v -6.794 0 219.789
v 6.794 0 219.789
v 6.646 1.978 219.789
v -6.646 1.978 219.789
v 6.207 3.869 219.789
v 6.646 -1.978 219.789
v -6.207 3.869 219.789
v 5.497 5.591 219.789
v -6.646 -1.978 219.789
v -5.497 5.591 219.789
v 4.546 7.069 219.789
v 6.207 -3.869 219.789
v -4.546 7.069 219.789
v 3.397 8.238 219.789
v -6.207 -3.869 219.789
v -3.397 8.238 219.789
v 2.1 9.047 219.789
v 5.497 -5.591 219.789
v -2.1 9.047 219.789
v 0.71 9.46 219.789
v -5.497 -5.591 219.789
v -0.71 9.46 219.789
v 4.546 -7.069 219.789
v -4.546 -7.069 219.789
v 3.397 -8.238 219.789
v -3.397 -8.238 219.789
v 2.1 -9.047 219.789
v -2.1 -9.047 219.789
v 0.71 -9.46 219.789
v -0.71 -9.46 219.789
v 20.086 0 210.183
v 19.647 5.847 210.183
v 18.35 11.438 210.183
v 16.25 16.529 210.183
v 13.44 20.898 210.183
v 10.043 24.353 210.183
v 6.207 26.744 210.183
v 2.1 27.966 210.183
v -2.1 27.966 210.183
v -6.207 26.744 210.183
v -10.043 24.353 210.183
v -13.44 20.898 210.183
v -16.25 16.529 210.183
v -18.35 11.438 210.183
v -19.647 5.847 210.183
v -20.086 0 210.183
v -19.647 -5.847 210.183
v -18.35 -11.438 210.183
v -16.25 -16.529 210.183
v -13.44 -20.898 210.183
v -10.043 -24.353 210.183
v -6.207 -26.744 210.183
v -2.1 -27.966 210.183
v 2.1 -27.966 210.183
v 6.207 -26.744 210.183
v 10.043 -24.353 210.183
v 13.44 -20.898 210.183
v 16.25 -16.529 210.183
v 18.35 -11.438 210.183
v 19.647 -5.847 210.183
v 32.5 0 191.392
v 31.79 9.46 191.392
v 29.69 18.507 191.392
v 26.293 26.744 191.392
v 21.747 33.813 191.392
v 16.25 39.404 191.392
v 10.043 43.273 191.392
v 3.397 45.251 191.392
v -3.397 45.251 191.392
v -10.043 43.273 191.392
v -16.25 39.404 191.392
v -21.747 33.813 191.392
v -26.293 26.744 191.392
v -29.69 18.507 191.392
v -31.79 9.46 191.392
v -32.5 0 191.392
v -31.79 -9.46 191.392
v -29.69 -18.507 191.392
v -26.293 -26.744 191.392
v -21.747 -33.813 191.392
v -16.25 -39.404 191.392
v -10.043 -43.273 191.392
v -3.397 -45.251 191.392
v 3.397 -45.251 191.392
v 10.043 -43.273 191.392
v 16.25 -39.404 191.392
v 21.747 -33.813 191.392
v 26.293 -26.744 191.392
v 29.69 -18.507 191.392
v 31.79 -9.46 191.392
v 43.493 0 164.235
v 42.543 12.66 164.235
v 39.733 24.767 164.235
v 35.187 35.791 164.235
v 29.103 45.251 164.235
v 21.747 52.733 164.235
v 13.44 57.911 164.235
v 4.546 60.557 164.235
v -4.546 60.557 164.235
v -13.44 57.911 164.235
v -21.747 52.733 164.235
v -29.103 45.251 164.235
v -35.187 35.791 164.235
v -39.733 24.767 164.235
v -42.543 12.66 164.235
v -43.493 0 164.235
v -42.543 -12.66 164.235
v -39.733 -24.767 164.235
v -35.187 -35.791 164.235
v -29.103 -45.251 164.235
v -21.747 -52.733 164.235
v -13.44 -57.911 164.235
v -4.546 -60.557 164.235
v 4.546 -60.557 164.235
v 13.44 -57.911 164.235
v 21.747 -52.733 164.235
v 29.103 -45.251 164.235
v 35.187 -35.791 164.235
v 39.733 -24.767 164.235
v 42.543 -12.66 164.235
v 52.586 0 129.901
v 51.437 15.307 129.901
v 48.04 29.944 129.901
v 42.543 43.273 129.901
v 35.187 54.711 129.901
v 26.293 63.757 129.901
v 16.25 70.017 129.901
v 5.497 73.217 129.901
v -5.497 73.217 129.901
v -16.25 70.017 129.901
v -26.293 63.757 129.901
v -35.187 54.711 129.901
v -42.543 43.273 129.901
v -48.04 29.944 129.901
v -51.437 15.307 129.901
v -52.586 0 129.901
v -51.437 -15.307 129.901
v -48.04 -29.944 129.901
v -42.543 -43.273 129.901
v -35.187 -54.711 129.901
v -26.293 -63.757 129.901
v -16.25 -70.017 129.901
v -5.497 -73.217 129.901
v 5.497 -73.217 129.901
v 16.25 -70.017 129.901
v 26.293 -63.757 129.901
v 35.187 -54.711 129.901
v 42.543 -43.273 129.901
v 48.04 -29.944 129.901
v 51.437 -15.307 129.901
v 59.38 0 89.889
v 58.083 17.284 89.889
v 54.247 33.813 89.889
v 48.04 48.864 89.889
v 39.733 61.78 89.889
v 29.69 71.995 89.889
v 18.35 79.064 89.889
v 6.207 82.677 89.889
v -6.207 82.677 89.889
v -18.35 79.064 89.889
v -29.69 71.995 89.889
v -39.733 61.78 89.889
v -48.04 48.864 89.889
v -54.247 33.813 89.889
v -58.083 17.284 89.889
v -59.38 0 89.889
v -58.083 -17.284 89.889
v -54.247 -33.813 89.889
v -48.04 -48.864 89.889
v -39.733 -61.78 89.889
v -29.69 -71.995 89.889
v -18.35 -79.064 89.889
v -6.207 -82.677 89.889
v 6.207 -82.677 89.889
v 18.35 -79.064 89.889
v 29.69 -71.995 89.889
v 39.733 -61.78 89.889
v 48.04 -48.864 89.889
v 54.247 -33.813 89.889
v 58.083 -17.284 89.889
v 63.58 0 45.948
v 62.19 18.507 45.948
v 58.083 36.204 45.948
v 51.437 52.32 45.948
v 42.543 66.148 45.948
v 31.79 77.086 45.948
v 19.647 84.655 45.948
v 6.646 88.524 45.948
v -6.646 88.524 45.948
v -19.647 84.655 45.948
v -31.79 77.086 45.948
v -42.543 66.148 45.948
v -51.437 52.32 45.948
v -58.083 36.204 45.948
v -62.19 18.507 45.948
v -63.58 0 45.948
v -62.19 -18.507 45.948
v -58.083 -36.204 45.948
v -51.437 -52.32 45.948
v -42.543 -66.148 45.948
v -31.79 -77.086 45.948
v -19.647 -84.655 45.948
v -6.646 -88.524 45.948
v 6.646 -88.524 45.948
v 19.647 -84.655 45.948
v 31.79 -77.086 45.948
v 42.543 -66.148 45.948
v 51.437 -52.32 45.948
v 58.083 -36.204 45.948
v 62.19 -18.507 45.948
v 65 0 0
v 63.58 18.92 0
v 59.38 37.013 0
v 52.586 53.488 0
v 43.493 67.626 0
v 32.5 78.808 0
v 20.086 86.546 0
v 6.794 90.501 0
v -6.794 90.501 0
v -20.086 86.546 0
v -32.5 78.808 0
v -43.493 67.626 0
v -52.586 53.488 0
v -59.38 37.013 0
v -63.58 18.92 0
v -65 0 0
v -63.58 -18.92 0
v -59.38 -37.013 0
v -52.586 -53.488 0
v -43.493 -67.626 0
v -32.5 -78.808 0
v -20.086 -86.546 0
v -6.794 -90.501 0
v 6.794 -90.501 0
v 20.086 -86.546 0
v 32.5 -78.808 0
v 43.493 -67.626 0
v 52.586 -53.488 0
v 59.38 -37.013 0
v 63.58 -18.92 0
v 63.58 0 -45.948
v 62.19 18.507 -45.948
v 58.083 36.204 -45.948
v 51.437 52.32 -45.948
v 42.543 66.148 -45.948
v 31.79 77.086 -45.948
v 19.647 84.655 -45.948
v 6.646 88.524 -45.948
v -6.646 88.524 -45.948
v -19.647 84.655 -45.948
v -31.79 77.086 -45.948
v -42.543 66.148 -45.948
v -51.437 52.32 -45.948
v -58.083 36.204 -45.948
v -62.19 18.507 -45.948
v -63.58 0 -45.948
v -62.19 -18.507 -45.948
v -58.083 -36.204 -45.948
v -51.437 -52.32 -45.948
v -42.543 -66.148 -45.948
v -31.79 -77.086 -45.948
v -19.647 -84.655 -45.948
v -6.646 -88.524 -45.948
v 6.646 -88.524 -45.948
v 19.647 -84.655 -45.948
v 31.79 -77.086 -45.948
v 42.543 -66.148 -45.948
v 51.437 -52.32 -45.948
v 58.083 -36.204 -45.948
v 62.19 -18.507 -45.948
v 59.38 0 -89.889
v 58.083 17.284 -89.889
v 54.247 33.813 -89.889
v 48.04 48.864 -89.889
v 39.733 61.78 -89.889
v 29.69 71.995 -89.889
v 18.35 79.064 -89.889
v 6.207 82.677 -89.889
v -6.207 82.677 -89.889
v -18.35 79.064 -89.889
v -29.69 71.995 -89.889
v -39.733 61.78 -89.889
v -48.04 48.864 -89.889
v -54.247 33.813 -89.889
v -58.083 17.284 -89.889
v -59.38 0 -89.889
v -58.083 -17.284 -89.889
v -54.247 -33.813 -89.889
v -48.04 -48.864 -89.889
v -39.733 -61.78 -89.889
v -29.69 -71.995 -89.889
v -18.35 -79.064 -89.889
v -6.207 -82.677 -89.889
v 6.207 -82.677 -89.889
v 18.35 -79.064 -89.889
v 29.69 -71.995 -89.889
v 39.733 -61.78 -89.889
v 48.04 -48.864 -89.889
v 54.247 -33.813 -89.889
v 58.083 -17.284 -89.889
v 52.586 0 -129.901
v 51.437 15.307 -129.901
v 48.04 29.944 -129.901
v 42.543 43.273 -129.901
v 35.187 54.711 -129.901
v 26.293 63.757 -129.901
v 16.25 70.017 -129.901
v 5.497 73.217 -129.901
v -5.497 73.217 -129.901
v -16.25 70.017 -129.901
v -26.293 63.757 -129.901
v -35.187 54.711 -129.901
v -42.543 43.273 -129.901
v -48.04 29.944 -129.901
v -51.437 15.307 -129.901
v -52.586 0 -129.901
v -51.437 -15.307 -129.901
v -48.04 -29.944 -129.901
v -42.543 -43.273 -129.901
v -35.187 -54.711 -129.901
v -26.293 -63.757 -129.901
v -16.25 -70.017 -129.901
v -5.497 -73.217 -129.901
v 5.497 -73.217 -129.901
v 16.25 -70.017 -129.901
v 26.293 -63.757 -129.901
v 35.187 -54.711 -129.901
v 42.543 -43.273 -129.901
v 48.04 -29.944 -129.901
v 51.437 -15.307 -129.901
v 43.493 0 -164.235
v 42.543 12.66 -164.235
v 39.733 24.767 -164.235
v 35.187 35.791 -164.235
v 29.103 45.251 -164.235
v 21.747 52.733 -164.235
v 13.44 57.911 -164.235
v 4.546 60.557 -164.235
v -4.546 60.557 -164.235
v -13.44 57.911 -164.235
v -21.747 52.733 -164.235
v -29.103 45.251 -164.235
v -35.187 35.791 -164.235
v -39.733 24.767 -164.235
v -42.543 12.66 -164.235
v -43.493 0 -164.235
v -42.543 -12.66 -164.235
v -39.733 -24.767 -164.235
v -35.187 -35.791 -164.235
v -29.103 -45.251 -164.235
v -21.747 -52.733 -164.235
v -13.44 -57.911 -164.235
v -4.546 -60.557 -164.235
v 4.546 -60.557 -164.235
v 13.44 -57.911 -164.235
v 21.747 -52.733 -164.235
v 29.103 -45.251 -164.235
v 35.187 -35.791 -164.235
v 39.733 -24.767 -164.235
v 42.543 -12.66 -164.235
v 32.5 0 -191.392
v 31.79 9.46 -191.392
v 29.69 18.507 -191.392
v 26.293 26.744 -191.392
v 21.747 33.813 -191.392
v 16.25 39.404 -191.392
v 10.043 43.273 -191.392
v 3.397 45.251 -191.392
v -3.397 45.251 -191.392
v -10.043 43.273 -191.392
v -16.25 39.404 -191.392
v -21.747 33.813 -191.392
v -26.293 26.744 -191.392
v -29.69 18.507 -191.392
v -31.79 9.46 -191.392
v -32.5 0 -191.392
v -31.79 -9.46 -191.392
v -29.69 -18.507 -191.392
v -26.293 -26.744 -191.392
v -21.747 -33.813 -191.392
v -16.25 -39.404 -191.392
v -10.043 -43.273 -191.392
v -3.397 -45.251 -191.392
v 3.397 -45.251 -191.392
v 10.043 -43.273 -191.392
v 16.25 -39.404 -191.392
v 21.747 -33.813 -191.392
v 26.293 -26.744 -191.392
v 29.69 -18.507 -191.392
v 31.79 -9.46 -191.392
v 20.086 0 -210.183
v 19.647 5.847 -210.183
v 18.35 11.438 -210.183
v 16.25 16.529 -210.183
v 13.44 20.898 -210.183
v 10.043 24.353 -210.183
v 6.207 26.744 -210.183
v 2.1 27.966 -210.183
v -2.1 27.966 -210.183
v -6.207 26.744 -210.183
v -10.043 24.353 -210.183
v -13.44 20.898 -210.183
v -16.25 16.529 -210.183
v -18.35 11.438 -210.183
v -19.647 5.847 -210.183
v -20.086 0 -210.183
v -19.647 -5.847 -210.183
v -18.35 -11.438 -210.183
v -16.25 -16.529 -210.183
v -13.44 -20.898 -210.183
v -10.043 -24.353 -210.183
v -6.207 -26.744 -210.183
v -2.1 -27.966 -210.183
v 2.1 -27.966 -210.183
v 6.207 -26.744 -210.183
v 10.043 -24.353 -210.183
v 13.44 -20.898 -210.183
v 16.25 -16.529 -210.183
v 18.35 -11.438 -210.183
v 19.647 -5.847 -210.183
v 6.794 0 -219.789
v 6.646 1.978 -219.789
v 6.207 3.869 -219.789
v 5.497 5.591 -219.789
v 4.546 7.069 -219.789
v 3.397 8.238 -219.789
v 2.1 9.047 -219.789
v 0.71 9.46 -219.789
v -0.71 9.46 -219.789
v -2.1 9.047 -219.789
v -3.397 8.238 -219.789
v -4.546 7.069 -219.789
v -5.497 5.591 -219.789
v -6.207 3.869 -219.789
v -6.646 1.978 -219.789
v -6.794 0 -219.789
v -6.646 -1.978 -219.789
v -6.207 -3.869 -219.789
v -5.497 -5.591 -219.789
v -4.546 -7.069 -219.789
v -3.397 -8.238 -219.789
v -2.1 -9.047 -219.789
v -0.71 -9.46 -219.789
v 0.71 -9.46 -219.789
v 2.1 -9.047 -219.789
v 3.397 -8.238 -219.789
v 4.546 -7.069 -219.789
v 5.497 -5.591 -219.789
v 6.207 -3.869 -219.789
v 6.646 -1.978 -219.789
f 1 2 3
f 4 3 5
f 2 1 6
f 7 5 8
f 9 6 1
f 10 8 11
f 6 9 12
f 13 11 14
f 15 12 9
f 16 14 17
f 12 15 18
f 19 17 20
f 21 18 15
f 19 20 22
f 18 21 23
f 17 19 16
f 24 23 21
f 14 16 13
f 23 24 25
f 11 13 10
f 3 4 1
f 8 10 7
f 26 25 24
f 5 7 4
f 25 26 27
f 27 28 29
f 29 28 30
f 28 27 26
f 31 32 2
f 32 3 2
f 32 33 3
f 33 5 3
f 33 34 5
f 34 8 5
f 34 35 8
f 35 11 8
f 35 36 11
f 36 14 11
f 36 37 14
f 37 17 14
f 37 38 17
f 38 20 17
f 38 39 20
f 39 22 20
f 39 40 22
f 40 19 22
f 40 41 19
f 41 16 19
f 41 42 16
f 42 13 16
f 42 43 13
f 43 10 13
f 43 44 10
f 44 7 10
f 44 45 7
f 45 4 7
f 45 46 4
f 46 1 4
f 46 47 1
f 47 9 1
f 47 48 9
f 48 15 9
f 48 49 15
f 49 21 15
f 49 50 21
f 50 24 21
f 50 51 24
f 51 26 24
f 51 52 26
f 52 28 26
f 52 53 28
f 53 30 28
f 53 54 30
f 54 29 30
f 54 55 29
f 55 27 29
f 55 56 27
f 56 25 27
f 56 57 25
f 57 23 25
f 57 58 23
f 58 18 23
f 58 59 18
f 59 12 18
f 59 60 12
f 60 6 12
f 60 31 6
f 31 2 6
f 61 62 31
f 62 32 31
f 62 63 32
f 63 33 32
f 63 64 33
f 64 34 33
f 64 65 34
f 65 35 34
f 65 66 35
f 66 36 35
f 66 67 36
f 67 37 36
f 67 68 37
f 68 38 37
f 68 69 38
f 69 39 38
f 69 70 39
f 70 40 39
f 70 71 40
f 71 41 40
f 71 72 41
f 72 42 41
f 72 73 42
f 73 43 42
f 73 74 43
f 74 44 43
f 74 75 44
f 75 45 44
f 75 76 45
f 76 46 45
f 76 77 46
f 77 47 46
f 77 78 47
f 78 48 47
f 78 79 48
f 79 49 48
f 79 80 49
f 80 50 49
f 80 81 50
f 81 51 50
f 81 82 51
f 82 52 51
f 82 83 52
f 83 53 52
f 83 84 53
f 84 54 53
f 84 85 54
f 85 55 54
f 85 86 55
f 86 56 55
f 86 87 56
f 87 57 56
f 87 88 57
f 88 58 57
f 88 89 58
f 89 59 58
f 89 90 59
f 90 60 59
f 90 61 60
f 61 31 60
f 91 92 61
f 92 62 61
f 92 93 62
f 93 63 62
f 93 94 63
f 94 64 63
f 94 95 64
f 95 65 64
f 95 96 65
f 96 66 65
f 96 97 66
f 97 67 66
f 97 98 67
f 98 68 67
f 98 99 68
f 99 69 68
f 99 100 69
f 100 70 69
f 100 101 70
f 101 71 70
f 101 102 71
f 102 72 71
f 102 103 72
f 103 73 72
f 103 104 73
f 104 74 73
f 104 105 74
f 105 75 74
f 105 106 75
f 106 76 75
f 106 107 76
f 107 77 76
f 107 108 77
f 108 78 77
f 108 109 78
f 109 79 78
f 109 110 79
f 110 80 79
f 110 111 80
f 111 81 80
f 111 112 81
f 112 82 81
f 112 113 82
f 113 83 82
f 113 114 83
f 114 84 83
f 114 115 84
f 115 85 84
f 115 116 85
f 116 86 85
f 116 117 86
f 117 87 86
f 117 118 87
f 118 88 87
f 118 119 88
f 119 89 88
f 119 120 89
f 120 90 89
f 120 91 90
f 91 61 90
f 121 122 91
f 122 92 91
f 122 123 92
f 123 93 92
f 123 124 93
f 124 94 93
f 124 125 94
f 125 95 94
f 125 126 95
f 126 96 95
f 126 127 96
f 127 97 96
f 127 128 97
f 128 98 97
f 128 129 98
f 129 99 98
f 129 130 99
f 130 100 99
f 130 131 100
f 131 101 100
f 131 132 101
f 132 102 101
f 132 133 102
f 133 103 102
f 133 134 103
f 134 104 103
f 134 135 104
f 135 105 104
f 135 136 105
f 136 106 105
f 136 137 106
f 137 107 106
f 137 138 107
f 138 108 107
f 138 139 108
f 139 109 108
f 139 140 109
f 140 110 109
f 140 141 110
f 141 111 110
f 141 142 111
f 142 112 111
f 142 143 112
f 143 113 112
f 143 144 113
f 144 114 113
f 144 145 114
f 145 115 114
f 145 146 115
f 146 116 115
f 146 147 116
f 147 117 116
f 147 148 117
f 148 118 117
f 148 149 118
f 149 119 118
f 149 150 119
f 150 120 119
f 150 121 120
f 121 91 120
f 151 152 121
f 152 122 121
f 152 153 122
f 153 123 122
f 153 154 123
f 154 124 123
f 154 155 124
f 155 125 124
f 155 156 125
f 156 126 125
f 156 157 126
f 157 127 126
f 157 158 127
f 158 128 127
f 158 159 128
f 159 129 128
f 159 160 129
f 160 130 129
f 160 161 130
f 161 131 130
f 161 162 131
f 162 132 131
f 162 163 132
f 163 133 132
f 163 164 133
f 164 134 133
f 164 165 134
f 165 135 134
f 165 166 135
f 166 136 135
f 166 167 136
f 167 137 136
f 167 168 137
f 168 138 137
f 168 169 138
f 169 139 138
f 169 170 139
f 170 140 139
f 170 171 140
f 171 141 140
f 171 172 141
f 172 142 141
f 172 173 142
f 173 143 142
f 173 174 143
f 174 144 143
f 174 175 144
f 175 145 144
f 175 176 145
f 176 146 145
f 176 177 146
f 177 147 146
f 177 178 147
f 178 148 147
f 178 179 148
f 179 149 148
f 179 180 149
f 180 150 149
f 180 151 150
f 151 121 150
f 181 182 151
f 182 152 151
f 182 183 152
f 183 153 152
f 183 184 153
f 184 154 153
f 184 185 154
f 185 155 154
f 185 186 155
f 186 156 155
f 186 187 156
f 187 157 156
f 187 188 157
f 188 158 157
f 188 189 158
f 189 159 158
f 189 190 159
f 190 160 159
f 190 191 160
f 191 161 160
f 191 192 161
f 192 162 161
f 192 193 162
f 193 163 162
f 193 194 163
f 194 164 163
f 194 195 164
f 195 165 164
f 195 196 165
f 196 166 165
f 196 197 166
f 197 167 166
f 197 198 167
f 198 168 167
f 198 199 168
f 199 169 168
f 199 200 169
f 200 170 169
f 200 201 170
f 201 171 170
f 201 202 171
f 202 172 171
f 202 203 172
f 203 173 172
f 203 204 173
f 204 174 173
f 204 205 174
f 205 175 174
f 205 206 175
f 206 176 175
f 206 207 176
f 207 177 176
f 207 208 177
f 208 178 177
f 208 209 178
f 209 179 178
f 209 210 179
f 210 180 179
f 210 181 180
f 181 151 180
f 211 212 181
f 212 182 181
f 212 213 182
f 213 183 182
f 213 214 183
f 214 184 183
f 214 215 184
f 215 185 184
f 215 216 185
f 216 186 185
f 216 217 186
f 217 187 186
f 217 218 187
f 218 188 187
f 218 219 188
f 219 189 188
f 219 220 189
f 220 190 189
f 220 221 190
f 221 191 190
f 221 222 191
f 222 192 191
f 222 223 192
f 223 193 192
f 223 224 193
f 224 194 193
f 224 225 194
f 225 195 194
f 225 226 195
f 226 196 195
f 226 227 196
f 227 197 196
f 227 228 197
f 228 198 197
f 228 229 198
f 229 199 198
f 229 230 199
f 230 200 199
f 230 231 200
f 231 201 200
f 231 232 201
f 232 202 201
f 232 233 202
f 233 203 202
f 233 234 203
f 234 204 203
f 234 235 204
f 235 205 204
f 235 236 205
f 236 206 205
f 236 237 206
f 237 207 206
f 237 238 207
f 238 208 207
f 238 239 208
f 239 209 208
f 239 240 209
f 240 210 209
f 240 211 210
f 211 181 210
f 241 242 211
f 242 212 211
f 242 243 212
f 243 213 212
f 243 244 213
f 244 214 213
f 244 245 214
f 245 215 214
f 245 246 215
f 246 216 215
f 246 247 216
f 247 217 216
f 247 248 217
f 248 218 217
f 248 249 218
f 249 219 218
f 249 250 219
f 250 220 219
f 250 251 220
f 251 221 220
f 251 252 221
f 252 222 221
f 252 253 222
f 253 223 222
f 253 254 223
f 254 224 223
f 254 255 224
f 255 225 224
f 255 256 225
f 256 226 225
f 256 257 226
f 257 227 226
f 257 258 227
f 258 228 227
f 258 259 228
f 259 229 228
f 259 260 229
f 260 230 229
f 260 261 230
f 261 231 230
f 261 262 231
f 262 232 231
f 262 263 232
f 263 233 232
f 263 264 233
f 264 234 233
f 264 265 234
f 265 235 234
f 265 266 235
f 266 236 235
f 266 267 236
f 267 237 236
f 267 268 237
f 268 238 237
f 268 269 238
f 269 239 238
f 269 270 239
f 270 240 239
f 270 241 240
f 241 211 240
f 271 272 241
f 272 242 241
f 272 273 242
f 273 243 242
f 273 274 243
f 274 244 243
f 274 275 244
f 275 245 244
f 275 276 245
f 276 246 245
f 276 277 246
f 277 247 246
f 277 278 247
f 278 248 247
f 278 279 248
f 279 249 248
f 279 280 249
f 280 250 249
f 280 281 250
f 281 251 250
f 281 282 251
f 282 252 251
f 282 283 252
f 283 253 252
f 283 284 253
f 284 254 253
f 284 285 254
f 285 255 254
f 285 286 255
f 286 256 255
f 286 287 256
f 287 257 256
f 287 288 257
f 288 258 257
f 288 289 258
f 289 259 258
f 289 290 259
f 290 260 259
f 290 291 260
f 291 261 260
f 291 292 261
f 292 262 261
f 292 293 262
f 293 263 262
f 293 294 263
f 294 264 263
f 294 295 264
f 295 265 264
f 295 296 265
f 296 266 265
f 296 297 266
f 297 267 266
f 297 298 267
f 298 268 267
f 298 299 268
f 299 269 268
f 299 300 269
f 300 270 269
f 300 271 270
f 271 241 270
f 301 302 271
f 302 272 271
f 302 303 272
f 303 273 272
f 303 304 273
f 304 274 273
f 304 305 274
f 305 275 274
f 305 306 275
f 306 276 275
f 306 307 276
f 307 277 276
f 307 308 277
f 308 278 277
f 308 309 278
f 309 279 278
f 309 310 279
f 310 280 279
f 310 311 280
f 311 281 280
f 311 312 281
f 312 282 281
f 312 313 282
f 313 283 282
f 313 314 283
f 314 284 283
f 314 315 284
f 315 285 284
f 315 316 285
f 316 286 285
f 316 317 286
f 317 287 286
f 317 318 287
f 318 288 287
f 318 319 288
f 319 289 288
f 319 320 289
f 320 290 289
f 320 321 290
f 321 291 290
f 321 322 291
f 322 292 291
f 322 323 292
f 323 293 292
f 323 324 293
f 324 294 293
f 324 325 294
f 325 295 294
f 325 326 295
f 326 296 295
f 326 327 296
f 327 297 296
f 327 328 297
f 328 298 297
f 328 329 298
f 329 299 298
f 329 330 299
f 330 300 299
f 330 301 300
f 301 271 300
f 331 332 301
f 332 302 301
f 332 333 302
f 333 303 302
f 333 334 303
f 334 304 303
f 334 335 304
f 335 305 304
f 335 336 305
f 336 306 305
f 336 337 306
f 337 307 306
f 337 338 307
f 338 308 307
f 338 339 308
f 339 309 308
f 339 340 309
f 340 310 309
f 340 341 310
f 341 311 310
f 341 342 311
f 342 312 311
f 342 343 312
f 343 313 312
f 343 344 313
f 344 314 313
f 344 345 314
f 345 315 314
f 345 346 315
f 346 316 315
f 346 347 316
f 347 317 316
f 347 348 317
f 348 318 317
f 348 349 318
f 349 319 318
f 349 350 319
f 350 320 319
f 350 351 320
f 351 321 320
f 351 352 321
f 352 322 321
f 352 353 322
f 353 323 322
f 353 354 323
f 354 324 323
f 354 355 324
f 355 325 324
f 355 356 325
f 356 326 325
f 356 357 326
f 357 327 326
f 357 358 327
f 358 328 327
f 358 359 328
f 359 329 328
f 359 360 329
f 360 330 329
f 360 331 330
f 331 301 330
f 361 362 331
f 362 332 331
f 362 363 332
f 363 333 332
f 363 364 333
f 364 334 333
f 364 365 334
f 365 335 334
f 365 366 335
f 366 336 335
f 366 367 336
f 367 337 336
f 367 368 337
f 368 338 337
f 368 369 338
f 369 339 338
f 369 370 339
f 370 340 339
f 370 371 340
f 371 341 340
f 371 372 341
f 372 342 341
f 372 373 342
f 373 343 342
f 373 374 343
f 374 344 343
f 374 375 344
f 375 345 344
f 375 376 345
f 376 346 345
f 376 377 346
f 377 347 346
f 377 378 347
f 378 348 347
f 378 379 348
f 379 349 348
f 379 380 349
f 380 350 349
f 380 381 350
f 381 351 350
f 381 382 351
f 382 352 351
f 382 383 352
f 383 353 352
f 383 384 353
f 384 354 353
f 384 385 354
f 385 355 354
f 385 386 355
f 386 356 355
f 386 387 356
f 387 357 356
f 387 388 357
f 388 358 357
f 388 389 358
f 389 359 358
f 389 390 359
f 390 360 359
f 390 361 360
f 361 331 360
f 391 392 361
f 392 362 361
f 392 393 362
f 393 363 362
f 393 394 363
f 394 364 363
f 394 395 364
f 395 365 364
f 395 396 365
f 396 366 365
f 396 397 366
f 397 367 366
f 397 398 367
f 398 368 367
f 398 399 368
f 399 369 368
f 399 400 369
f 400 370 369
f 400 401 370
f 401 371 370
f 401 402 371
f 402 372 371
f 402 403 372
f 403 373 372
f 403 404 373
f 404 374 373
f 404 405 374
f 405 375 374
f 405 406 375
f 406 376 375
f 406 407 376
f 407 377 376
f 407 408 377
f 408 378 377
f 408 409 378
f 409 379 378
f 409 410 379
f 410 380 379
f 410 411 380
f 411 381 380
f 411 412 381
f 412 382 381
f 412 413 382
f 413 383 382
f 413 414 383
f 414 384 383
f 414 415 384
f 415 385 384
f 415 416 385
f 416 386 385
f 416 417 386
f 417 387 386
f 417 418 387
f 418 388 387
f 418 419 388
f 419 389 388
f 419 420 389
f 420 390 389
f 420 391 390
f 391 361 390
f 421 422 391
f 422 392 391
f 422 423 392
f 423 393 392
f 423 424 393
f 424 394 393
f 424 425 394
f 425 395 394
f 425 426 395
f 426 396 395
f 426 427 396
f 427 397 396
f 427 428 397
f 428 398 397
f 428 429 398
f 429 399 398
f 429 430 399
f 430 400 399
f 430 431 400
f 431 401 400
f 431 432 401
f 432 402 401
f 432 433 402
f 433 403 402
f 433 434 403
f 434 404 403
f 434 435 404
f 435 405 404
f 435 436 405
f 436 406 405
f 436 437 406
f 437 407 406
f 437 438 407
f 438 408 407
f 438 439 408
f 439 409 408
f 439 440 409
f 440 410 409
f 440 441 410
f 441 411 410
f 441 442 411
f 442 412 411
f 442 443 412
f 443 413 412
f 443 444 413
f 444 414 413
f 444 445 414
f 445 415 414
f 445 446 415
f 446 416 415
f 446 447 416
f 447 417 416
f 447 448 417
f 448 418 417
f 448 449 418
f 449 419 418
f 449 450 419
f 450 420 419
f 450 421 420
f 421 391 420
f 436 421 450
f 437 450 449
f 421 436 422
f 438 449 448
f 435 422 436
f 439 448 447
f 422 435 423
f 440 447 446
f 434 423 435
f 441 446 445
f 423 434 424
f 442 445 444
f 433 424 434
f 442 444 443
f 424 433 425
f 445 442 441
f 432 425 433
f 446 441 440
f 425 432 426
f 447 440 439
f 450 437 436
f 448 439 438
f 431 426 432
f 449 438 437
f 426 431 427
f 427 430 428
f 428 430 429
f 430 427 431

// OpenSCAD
// Generated by SolidPython 1.0.1 on 2020-07-29 00:46:46


scale(v = [5, 7, 17]) {
	sphere(r = 13);
}
/***********************************************
*********      SolidPython code:      **********
************************************************
 
# import packages: SolidPython
from solid import *
from solid.utils import *
from itertools import chain, combinations, permutations


class Resize:

    def __init__(self, scad_file):
        self.scad_file = scad_file
        #self.scad_file = import_scad(scad_file)
        # cone/cylinder param:
        self.r1 = 0
        self.r2 = 0
        self.h = 0
        # rectangular prism param:
        self.w = 0
        self.l = 0
        # ellipse param:
        self.r = 0

    # import OpenScad code (file name corresponds to shape)


    # classify shape + parameters
    def assign(self, param1, param2, param3):
        if self.scad_file == 'cone.scad':
            self.r1 = param1
            self.r2 = param2
            self.h = param3
        elif self.scad_file == 'cylinder.scad':
            self.r1 = param1
            self.r2 = param2
            self.h = param3
        elif self.scad_file == 'rectangularPrism.scad':
            self.h = param1
            self.l = param2
            self.w = param3
        else:
            self.r = param1
            self.h = param2

    # resize parameters
    def iterate(self):
        x = range(3, 20, 2)
        i = 1
        if self.scad_file == 'cone.scad':
            tempList = list(permutations(x, 2))
            for temp in tempList:
                param1 = temp[0]
                param2 = temp[1]
                filepath = 'produced_scad_files/' + 'cone' + str(param1) + '_' + str(param2) + '_' + '.scad'
                scad_render_to_file(cylinder(h=param1, r1=param2, r2=0), filepath)

        elif self.scad_file == 'cylinder.scad':
            tempList = list(permutations(x, 3))
            for temp in tempList:
                param1 = temp[0]
                param2 = temp[1]
                filepath = 'produced_scad_files/' + 'cylinder' + str(param1) + '_' + str(param2) + '_' + '.scad'
                scad_render_to_file(cylinder(h=param1, r1=param2, r2=param2), filepath)

        elif self.scad_file == 'rectangularPrism.scad':
            tempList = list(permutations(x, 3))
            for temp in tempList:
                param1 = temp[0]
                param2 = temp[1]
                param3 = temp[2]
                filepath = 'produced_scad_files/' + 'rectangularPrism' + str(param1) + '_' + str(param2) + '_' + str(
                    param3) + '.scad'
                scad_render_to_file(cube(size=(param1, param2, param3)), filepath)

        elif self.scad_file == 'ellipse.scad':
            tempList = list(permutations(x, 4))
            for temp in tempList:
                param1 = temp[0]
                param2 = temp[1]
                param3 = temp[2]
                param4 = temp[3]
                filepath = 'produced_scad_files/' + 'ellipse' + str(param1) + '_' + str(param2) + '_' + str(param3) + '_' + str(param4) + '.scad'
                scad_render_to_file(scale([param1, param2, param3])(sphere(r=param4)), filepath)

    def render_to_scadfile(self):
        scad_render_to_file(scad, 'example.scad') 
 
************************************************/
